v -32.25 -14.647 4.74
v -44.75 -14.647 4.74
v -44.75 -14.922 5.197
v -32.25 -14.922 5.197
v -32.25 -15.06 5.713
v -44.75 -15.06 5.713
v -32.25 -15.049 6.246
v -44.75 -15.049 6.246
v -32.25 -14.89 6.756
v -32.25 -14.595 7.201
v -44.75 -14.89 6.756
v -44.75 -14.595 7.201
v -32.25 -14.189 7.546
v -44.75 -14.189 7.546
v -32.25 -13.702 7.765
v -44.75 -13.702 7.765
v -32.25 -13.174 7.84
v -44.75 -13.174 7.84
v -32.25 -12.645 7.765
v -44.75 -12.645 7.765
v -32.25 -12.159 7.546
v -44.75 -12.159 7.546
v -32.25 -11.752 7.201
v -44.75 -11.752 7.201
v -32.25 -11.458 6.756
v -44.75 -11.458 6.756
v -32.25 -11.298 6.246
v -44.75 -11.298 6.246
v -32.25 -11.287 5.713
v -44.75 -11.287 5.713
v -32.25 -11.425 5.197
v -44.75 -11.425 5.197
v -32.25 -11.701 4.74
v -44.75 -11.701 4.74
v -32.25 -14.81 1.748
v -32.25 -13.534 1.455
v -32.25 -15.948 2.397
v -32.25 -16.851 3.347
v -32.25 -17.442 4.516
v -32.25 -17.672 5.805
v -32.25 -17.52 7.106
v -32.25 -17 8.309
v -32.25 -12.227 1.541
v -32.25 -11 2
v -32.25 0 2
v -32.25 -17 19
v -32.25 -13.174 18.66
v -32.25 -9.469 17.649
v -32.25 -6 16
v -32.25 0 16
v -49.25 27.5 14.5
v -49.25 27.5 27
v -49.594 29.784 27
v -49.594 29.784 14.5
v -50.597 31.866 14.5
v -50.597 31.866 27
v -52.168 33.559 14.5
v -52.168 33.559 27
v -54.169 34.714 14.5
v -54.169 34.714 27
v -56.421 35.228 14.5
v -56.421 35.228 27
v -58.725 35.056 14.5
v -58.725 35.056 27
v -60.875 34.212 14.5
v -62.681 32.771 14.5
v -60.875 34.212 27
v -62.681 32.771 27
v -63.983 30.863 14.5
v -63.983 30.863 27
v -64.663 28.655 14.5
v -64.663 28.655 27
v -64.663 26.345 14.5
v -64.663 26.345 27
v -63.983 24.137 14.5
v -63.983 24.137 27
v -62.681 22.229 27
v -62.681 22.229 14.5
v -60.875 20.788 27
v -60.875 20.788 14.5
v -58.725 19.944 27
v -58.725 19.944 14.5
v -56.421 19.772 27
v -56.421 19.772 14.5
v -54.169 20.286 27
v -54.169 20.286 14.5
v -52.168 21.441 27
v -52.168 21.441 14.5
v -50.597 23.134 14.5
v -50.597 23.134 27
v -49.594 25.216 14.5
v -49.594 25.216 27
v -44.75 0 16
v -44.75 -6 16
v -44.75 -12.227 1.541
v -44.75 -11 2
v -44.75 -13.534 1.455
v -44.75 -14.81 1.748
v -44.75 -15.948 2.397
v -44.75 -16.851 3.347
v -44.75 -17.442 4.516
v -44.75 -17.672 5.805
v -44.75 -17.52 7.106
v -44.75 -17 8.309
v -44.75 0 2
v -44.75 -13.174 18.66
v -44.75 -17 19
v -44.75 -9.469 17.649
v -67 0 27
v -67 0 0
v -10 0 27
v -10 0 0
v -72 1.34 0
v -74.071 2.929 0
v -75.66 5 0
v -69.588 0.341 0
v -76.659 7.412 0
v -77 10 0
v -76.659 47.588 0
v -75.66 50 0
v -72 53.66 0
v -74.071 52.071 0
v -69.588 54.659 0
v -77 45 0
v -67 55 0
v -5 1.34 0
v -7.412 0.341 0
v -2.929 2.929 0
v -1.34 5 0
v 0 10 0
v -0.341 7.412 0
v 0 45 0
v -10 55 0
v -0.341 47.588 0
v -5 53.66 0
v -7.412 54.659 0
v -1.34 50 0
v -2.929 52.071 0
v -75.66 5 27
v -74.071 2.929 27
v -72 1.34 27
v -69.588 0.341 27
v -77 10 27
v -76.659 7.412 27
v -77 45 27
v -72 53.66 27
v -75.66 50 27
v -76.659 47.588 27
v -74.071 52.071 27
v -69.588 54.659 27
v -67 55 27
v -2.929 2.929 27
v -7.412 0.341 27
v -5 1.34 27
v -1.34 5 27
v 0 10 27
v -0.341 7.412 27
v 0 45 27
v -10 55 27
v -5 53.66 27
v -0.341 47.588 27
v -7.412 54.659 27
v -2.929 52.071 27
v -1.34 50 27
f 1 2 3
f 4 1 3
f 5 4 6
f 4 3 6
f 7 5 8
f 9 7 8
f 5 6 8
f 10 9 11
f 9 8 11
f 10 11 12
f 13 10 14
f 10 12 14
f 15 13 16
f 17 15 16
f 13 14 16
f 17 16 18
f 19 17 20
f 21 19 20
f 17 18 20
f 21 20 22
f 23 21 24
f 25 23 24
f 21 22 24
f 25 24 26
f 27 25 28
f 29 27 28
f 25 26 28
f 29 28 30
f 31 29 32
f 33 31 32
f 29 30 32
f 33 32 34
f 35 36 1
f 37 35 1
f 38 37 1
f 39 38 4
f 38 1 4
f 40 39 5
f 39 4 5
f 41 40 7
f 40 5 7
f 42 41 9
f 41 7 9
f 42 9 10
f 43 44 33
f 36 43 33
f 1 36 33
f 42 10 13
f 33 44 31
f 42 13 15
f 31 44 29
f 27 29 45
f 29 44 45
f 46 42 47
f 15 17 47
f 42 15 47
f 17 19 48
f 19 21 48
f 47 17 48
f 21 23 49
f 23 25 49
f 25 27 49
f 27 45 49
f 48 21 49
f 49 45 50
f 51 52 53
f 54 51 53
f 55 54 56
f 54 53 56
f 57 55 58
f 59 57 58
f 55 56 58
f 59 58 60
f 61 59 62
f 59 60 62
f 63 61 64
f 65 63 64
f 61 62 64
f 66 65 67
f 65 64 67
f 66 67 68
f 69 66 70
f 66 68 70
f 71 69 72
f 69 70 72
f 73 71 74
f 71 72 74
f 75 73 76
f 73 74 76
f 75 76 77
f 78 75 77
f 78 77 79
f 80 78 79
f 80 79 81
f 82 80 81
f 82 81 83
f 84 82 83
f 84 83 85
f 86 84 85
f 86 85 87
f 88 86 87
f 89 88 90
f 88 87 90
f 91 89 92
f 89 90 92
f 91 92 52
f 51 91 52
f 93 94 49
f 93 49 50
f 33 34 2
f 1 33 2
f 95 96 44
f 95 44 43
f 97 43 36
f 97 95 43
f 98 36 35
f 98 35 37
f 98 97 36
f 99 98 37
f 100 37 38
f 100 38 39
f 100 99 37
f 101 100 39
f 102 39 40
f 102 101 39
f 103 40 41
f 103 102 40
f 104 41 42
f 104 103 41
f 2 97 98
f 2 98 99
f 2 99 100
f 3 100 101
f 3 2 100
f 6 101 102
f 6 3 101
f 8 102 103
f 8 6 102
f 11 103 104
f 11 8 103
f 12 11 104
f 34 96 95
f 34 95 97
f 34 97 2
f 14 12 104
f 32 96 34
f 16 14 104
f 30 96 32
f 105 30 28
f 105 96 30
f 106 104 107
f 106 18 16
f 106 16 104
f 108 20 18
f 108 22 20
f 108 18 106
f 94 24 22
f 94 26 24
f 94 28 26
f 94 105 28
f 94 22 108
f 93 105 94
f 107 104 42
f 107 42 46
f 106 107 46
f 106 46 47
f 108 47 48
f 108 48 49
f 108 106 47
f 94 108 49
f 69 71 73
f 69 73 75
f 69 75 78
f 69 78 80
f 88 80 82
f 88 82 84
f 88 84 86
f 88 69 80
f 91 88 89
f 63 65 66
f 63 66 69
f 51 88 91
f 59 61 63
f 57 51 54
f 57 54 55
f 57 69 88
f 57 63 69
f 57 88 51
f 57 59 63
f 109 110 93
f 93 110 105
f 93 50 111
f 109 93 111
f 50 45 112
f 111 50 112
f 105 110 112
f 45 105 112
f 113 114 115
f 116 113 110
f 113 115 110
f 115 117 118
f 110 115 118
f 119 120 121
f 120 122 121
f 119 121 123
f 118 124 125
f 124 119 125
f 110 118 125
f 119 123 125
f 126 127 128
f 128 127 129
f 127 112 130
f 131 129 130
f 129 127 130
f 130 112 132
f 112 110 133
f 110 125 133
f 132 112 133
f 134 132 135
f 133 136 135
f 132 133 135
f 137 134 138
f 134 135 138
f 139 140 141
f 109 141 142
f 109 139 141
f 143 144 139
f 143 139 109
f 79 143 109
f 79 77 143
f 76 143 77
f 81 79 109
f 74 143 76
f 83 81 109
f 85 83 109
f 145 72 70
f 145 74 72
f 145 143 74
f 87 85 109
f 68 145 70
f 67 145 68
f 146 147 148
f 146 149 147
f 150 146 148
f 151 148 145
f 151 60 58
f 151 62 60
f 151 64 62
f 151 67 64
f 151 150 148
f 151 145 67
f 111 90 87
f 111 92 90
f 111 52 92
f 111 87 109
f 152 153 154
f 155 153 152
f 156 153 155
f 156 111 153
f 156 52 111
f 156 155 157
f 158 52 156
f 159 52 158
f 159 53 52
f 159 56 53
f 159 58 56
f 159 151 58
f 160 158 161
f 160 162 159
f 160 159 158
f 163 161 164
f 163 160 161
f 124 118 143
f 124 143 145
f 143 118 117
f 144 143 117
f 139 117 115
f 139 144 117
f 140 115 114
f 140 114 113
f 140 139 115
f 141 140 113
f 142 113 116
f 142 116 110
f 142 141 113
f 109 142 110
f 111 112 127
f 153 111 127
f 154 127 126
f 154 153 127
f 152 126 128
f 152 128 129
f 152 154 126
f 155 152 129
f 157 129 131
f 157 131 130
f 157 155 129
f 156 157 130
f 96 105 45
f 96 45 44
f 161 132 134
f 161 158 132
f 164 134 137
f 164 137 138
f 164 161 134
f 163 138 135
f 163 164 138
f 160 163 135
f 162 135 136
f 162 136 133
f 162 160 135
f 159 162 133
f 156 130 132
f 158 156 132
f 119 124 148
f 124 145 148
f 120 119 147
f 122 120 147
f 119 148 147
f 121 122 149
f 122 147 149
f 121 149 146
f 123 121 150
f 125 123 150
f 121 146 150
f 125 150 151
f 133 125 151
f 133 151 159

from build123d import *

# Parameters (mm, degrees)
SKETCH1_W           = 77
SKETCH1_H           = 55
BOSS_EXTRUDE1_DEPTH = 27
FILLET1_R           = 10
BOSS_EXTRUDE2_START = -44.75
BOSS_EXTRUDE2_DEPTH = 12.5
SKETCH3_R           = 7.75
CUT_EXTRUDE1_DEPTH  = 12.5


with BuildPart() as part:
    # Sketch1 → Boss-Extrude1 (new body)
    with BuildSketch(Plane.XY):
        with Locations((-38.5, 27.5)):
            Rectangle(SKETCH1_W, SKETCH1_H)
    extrude(amount=BOSS_EXTRUDE1_DEPTH)

    # Fillet1
    fillet1_edges = [part.edges().sort_by_distance(p)[0] for p in [
        (0, 0, 13.5),
        (-77, 0, 13.5),
        (-77, 55, 13.5),
        (0, 55, 13.5),
    ]]
    fillet(fillet1_edges, radius=FILLET1_R)

    # Sketch2 → Boss-Extrude2 (add)
    with BuildSketch(Plane(origin=(0, 0, 0), x_dir=(0, 0, -1), z_dir=(1, 0, 0)).offset(BOSS_EXTRUDE2_START)):
        with BuildLine():
            Line((-2, 0), (-2, -11))
            ThreePointArc((-2, -11), (-2.838969197, -16.434369418), (-8.308548919, -17))
            Line((-8.308548919, -17), (-19, -17))
            ThreePointArc((-19, -17), (-18.23654946, -11.299122875), (-16, -6))
            Line((-16, -6), (-16, 0))
            Line((-16, 0), (-2, 0))
        make_face()
        with BuildLine():
            Line((-4.740210034, -11.700555844), (-4.740210034, -14.646739817))
            ThreePointArc((-4.740210034, -14.646739817), (-7.840210034, -13.17364783), (-4.740210034, -11.700555844))
        make_face(mode=Mode.SUBTRACT)
    extrude(amount=BOSS_EXTRUDE2_DEPTH)

    # Sketch3 → Cut-Extrude1 (cut)
    with BuildSketch(Plane.XY.offset(27)):
        with Locations((-57, 27.5)):
            Circle(SKETCH3_R)
    extrude(amount=-CUT_EXTRUDE1_DEPTH, mode=Mode.SUBTRACT)


solid = part.part
